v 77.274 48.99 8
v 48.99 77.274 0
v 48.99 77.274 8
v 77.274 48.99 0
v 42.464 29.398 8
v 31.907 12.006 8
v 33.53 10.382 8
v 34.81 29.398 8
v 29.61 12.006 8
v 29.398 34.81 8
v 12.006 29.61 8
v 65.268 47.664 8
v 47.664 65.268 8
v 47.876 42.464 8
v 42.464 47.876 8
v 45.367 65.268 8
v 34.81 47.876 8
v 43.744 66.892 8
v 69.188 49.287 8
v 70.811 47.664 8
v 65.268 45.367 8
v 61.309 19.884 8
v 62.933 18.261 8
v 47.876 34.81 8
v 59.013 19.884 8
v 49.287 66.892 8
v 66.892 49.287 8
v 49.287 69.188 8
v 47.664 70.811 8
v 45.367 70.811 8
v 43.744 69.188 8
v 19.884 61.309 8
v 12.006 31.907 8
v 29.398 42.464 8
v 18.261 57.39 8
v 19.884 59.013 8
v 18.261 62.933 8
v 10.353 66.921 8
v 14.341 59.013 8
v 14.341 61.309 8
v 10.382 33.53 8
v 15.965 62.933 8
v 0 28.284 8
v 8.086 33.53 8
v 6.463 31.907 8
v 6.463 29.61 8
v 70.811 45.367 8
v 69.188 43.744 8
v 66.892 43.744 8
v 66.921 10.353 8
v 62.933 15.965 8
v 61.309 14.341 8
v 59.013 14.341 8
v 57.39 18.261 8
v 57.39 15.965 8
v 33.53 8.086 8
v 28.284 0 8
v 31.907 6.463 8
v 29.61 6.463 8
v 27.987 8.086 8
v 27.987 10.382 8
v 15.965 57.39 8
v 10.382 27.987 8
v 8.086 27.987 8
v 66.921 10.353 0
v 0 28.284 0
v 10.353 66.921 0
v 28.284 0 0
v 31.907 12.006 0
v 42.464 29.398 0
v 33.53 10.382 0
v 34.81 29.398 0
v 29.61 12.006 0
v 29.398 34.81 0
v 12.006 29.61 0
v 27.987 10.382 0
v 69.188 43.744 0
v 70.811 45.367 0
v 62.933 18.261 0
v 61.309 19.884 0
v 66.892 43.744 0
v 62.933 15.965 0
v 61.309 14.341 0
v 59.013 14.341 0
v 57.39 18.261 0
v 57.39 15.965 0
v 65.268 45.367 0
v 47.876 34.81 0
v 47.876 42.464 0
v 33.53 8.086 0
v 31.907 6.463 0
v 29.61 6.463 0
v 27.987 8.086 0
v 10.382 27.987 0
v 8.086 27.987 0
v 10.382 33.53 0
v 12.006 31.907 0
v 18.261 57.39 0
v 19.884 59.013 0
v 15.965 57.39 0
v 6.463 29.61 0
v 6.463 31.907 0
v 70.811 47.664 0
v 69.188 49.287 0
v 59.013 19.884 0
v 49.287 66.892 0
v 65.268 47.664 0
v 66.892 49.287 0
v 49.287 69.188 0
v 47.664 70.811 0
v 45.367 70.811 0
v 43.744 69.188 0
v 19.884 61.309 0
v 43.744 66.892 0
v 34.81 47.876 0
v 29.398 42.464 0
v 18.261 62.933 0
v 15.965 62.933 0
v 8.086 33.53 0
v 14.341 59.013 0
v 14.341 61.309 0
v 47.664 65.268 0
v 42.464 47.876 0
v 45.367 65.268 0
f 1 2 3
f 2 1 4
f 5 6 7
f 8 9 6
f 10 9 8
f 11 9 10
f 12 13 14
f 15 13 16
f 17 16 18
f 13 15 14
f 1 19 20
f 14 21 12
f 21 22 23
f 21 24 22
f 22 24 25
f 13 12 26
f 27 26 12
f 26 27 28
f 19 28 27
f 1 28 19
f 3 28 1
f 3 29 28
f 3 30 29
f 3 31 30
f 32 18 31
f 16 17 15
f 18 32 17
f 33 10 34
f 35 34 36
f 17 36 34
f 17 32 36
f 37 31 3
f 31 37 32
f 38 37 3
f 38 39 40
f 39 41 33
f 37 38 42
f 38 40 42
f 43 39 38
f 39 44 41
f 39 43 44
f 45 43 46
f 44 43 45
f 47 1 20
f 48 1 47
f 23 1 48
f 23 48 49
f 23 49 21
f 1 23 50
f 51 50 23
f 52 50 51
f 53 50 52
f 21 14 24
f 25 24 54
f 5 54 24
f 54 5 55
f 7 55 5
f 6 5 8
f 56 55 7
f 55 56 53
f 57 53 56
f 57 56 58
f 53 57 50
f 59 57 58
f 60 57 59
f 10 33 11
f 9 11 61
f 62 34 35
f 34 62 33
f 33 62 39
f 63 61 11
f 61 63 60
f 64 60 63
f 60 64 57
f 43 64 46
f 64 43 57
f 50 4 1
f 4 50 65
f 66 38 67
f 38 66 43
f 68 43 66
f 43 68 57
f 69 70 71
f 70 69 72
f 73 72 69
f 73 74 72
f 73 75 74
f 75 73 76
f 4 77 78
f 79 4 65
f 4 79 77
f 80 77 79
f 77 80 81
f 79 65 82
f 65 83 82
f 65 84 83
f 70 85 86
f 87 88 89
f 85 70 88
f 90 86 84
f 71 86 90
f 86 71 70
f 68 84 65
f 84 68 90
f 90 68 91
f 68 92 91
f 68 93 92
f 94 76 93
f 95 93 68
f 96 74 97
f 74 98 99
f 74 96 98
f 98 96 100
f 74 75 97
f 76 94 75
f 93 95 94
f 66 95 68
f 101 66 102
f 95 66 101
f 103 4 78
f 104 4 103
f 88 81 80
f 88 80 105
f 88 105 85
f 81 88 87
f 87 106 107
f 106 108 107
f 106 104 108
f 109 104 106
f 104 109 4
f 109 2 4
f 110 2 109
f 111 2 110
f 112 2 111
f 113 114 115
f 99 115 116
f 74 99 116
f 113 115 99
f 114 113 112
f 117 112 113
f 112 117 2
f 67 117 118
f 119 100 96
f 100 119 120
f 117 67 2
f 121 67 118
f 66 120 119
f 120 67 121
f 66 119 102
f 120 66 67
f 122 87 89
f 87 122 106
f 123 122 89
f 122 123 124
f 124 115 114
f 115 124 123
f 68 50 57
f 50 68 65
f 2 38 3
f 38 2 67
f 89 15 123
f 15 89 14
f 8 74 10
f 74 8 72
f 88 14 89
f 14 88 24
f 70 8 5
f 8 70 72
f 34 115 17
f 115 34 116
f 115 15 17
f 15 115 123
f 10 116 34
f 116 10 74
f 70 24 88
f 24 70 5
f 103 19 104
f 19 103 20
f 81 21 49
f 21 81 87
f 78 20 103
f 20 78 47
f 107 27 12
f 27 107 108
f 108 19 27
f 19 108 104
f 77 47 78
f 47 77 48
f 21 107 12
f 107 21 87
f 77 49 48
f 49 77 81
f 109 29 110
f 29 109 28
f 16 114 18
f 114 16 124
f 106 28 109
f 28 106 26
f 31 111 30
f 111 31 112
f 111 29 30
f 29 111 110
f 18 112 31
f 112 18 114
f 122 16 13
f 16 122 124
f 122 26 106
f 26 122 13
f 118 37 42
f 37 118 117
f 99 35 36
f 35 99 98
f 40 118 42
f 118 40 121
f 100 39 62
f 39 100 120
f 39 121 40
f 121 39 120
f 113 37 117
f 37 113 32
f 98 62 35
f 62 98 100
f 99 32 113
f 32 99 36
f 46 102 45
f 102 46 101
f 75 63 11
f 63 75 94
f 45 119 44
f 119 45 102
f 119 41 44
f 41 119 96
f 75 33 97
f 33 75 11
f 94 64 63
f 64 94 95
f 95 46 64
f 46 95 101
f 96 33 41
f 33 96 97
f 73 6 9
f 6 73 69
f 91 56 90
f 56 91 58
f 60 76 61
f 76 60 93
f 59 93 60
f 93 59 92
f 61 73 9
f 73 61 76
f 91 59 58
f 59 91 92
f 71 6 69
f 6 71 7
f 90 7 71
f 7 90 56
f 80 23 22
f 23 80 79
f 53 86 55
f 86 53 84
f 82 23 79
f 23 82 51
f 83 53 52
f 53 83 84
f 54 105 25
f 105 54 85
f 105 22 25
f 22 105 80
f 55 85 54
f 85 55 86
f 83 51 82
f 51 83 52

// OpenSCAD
$fn = 32;

// ----------------------------------------------------------------------
// Polygon plate: 6-gon R40, 6 bolt windows
// ----------------------------------------------------------------------

// --- parameters (mm) ---
sides = 6;                // number of polygon sides
plate_r = 40;             // circumscribed radius of the polygon
bore_r = 10;              // centre bore radius
bolts = 6;                // number of bolt windows
ring_r = 30.44;           // bolt-circle radius
bolt_r = 3;               // bolt window radius
plate_t = 8;              // plate thickness, Z (extrusion height)

plate_d = 2 * plate_r;  // circumscribed diameter
bore_d = 2 * bore_r;  // centre bore diameter
bolt_d = 2 * bolt_r;  // bolt window diameter
ring_d = 2 * ring_r;  // bolt-circle diameter

profile = [[77.274, 48.99], [48.99, 77.274], [10.353, 66.921], [0, 28.284], [28.284, 0], [66.921, 10.353]];  // primary outline, 6 points, counter clockwise
void_1 = [[47.876, 42.464], [42.464, 47.876], [34.81, 47.876], [29.398, 42.464], [29.398, 34.81], [34.81, 29.398], [42.464, 29.398], [47.876, 34.81]];  // centre bore, 8 points
void_2 = [[70.811, 47.664], [69.188, 49.287], [66.892, 49.287], [65.268, 47.664], [65.268, 45.367], [66.892, 43.744], [69.188, 43.744], [70.811, 45.367]];  // bolt window 1, 8 points
void_3 = [[49.287, 69.188], [47.664, 70.811], [45.367, 70.811], [43.744, 69.188], [43.744, 66.892], [45.367, 65.268], [47.664, 65.268], [49.287, 66.892]];  // bolt window 2, 8 points
void_4 = [[19.884, 61.309], [18.261, 62.933], [15.965, 62.933], [14.341, 61.309], [14.341, 59.013], [15.965, 57.39], [18.261, 57.39], [19.884, 59.013]];  // bolt window 3, 8 points
void_5 = [[12.006, 31.907], [10.382, 33.53], [8.086, 33.53], [6.463, 31.907], [6.463, 29.61], [8.086, 27.987], [10.382, 27.987], [12.006, 29.61]];  // bolt window 4, 8 points
void_6 = [[33.53, 10.382], [31.907, 12.006], [29.61, 12.006], [27.987, 10.382], [27.987, 8.086], [29.61, 6.463], [31.907, 6.463], [33.53, 8.086]];  // bolt window 5, 8 points
void_7 = [[62.933, 18.261], [61.309, 19.884], [59.013, 19.884], [57.39, 18.261], [57.39, 15.965], [59.013, 14.341], [61.309, 14.341], [62.933, 15.965]];  // bolt window 6, 8 points

// --- the one profile operation ---
difference() {
  linear_extrude(height = plate_t) polygon(points = profile);
  translate([0, 0, -1])
    linear_extrude(height = plate_t + 2) polygon(points = void_1);
  translate([0, 0, -1])
    linear_extrude(height = plate_t + 2) polygon(points = void_2);
  translate([0, 0, -1])
    linear_extrude(height = plate_t + 2) polygon(points = void_3);
  translate([0, 0, -1])
    linear_extrude(height = plate_t + 2) polygon(points = void_4);
  translate([0, 0, -1])
    linear_extrude(height = plate_t + 2) polygon(points = void_5);
  translate([0, 0, -1])
    linear_extrude(height = plate_t + 2) polygon(points = void_6);
  translate([0, 0, -1])
    linear_extrude(height = plate_t + 2) polygon(points = void_7);
}
